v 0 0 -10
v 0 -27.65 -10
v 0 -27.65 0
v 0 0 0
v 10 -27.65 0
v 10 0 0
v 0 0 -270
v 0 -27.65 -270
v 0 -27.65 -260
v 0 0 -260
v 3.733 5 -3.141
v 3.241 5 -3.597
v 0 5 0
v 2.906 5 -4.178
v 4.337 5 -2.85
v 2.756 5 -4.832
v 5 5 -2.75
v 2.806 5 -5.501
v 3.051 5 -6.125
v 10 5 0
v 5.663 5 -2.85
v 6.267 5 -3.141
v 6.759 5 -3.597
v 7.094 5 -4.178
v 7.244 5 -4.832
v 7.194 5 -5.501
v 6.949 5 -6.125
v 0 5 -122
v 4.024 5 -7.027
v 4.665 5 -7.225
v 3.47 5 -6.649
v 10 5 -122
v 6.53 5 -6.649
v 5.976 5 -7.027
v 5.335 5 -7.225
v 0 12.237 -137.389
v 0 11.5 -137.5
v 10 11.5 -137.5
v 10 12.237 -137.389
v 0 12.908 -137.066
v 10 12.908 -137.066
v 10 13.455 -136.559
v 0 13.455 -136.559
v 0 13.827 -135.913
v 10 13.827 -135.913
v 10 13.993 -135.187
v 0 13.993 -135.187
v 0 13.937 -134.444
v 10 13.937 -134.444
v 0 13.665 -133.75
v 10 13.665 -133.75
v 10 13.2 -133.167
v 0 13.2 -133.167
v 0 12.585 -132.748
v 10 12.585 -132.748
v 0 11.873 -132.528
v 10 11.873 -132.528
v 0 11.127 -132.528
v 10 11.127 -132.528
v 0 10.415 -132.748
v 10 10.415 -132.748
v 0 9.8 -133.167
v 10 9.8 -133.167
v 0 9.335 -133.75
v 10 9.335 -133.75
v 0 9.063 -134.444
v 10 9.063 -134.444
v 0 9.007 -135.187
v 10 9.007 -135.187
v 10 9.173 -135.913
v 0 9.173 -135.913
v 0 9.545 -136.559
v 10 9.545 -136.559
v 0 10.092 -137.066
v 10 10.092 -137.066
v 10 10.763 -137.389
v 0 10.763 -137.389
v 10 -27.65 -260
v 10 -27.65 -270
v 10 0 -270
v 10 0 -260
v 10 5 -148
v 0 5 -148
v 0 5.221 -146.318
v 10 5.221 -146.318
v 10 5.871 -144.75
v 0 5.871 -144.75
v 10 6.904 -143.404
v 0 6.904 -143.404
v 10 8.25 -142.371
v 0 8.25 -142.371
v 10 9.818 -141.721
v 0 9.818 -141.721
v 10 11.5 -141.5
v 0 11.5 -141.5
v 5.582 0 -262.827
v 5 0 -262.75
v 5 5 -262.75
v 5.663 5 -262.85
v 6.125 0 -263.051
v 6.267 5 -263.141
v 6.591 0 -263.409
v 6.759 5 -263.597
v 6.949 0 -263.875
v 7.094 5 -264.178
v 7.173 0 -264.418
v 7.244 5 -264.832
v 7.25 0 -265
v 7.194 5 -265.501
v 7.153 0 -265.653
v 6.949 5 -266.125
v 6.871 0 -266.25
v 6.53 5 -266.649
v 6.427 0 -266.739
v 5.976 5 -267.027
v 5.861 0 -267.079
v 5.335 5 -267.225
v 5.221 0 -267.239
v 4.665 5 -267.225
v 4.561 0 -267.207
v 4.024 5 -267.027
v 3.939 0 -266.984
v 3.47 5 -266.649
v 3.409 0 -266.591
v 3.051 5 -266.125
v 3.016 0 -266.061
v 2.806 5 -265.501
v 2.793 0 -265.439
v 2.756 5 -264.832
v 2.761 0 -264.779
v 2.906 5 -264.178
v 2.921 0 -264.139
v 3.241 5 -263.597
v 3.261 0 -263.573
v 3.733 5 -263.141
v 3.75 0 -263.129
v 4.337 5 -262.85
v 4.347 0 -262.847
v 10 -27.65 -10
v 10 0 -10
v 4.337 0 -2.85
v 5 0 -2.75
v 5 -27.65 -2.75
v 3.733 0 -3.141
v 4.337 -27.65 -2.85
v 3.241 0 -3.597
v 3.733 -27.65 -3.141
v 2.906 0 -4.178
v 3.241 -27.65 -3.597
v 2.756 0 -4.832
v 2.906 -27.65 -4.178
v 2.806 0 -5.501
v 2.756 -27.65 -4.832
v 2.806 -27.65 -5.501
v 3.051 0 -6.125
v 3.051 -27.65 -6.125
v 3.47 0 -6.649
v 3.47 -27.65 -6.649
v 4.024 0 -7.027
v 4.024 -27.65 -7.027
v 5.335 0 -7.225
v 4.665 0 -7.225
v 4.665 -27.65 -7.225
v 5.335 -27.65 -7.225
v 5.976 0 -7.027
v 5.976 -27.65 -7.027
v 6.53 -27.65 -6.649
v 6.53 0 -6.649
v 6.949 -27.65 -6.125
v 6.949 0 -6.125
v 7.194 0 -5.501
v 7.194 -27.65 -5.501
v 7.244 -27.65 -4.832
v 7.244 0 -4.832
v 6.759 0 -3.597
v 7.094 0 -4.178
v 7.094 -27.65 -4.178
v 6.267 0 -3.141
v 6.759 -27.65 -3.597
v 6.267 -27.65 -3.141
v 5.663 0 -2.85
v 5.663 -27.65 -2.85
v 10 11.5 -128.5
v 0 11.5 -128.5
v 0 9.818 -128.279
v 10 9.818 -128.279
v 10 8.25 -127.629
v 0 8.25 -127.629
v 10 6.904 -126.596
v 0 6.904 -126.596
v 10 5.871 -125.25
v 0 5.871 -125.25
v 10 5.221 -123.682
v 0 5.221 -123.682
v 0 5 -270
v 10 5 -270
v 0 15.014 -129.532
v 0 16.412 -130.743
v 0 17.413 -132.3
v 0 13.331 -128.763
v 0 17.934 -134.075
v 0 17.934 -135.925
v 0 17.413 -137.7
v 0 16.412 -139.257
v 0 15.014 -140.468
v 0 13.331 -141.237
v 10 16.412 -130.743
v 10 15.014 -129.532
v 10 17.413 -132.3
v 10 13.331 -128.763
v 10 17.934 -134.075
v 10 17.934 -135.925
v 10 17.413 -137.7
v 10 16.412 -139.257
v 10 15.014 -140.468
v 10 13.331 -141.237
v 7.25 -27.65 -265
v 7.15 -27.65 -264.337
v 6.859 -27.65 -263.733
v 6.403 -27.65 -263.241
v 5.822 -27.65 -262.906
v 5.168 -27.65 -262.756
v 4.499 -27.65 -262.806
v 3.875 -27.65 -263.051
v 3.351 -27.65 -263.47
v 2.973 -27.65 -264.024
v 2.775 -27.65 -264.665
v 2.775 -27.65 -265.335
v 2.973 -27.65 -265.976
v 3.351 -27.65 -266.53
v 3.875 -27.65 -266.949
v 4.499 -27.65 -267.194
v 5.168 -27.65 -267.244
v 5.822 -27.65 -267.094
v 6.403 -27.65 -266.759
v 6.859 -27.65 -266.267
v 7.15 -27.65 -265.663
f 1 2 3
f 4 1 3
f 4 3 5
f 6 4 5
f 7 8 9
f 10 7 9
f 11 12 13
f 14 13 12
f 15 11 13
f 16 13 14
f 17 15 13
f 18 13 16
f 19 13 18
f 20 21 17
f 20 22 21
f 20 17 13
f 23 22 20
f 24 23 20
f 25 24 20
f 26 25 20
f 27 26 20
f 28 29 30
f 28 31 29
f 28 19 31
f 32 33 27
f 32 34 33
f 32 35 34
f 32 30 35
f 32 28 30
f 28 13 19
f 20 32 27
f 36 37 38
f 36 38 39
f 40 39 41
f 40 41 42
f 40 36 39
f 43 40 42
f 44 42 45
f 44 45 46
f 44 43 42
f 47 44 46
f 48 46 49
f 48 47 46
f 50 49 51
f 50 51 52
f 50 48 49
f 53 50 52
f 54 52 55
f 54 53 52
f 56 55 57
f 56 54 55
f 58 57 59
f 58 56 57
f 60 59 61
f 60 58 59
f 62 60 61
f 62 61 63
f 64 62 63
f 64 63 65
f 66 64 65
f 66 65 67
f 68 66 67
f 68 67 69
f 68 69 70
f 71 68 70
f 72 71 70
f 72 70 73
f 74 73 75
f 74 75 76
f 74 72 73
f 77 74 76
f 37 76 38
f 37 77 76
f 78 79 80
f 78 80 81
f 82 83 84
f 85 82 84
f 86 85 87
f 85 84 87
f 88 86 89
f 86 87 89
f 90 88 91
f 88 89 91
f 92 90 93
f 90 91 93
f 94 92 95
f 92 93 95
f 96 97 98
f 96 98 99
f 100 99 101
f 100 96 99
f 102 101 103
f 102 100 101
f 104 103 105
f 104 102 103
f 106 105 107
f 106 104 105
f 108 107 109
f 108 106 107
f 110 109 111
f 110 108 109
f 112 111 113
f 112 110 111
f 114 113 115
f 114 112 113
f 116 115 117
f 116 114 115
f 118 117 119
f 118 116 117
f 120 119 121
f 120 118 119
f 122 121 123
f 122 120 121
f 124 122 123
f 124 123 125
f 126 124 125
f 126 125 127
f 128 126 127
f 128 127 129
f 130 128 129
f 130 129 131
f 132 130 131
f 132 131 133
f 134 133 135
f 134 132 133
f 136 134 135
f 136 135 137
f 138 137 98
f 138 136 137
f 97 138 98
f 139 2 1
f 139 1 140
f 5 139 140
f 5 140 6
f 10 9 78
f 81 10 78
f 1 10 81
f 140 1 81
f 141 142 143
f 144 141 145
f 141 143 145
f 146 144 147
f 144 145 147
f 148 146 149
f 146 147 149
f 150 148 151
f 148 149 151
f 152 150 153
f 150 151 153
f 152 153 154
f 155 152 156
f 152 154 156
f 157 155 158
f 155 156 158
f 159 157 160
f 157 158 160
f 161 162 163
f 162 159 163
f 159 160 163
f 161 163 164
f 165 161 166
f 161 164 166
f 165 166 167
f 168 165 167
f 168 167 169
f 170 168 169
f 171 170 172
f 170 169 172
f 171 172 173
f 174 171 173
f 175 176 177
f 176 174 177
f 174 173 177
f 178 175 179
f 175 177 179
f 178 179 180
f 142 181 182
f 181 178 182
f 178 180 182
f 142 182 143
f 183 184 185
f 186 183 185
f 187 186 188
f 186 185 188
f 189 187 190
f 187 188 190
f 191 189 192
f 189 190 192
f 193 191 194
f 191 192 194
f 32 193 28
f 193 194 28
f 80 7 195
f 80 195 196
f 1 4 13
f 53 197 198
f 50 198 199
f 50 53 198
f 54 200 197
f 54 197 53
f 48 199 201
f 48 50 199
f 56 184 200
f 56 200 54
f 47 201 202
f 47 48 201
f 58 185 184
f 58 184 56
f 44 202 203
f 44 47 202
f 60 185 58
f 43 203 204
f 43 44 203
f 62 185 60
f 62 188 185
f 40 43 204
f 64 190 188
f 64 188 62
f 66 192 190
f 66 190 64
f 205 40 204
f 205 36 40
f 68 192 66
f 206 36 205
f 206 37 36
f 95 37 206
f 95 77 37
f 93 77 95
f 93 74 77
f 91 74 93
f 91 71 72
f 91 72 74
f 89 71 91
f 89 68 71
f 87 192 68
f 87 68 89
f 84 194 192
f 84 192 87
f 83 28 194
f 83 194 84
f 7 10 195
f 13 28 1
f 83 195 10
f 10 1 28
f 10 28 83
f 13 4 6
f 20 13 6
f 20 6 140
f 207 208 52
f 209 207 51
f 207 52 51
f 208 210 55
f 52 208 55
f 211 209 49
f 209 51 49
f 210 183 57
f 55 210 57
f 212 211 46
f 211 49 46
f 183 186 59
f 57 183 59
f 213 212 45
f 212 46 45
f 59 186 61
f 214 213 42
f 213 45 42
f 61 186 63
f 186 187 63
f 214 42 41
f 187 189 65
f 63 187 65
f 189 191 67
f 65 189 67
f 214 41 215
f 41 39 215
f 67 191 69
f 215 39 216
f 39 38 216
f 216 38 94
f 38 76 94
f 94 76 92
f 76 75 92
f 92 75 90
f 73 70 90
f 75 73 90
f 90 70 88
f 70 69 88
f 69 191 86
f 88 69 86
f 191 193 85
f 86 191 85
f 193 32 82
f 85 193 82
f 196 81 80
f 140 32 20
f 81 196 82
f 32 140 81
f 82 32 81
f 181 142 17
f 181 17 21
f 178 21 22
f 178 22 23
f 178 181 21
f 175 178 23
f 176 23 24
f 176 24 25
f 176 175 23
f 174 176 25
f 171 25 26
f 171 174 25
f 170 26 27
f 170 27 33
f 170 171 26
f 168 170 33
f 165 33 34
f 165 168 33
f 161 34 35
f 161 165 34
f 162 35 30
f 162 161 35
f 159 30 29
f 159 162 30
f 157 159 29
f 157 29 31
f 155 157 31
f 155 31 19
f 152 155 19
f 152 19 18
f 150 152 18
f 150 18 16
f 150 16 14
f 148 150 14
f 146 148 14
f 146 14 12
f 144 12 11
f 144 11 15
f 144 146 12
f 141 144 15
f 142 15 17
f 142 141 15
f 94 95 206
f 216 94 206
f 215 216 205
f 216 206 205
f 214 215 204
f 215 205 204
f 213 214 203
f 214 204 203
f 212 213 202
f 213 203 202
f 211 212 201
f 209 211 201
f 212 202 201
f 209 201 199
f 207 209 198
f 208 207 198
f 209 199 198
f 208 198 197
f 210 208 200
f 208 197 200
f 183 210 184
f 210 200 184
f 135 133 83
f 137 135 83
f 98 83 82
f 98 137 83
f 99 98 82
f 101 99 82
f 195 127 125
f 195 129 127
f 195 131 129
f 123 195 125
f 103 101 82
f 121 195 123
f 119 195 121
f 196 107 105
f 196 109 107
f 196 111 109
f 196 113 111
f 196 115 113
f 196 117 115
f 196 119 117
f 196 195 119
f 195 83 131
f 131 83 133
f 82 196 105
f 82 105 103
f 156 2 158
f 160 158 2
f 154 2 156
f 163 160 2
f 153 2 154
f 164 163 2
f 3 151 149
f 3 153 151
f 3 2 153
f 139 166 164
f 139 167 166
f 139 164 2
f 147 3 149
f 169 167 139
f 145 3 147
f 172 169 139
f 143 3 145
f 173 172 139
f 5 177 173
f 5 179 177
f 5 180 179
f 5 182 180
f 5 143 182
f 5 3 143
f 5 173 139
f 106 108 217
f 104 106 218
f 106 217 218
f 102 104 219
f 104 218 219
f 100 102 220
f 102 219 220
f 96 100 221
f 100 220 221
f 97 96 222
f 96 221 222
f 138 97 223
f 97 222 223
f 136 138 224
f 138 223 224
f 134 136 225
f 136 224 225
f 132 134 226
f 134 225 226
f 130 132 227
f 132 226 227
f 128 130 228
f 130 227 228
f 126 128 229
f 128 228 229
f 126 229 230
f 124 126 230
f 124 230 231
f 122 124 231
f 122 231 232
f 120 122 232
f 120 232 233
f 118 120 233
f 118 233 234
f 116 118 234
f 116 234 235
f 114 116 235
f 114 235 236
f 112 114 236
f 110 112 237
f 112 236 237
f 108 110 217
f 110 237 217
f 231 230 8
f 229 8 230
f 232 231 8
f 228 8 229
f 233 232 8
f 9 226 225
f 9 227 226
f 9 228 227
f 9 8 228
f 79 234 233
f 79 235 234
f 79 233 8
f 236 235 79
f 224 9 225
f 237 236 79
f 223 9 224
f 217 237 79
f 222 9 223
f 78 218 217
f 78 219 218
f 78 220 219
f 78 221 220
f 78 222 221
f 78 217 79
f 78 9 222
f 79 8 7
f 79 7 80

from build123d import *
from build123d.topology import SkipClean

# Parameters (mm, degrees)
SKETCH_1_W      = 10
SKETCH_1_H      = 270
SKETCH_1_R      = 2.25
EXTRUDE_1_DEPTH = 5
SKETCH_2_R      = 2.5
EXTRUDE_2_DEPTH = 10
EXTRUDE_START   = 27.65
SKETCH_3_W      = 10
SKETCH_3_H      = 10
SKETCH_3_R      = 2.25
EXTRUDE_3_DEPTH = 27.65


with BuildPart() as part:
    # Эскиз1 → Бобышка-Вытянуть1 (new body)
    with BuildSketch(Plane(origin=(0, 0, 0), x_dir=(1, 0, 0), z_dir=(0, 1, 0))):
        with Locations((5, 135)):
            Rectangle(SKETCH_1_W, SKETCH_1_H)
        with Locations(Location((5, 265, 0), (0, 0, 270))):
            Circle(SKETCH_1_R, mode=Mode.SUBTRACT)
        with Locations(Location((5, 5, 0), (0, 0, 270))):
            Circle(SKETCH_1_R, mode=Mode.SUBTRACT)
    extrude(amount=EXTRUDE_1_DEPTH)

    # Эскиз2 → Бобышка-Вытянуть2 (add)
    with BuildSketch(Plane(origin=(0, 0, 0), x_dir=(0, 0, -1), z_dir=(1, 0, 0))):
        with BuildLine():
            Line((122, 5), (148, 5))
            ThreePointArc((148, 5), (143.403805922, 6.903805922), (141.5, 11.5))
            ThreePointArc((141.5, 11.5), (135, 18), (128.5, 11.5))
            ThreePointArc((128.5, 11.5), (126.596194078, 6.903805922), (122, 5))
        make_face()
        with Locations((135, 11.5)):
            Circle(SKETCH_2_R, mode=Mode.SUBTRACT)
    extrude(amount=EXTRUDE_2_DEPTH)

    # Эскиз3 → Бобышка-Вытянуть3 (add)
    # profile 1 of 2: a face of its own
    with SkipClean():  # the faces are left unmerged after this step: merging them gives an invalid solid
        with BuildSketch(Plane.XZ.offset(EXTRUDE_START)):
            with Locations((5, -5)):
                Rectangle(SKETCH_3_W, SKETCH_3_H)
            with Locations(Location((5, -5, 0), (0, 0, 90))):
                Circle(SKETCH_3_R, mode=Mode.SUBTRACT)
        # profile 2 of 2: a face of its own
        with BuildSketch(Plane.XZ.offset(EXTRUDE_START)):
            with Locations((5, -265)):
                Rectangle(SKETCH_3_W, SKETCH_3_H)
            with Locations((5, -265)):
                Circle(SKETCH_3_R, mode=Mode.SUBTRACT)
        extrude(amount=-EXTRUDE_3_DEPTH)


solid = part.part
